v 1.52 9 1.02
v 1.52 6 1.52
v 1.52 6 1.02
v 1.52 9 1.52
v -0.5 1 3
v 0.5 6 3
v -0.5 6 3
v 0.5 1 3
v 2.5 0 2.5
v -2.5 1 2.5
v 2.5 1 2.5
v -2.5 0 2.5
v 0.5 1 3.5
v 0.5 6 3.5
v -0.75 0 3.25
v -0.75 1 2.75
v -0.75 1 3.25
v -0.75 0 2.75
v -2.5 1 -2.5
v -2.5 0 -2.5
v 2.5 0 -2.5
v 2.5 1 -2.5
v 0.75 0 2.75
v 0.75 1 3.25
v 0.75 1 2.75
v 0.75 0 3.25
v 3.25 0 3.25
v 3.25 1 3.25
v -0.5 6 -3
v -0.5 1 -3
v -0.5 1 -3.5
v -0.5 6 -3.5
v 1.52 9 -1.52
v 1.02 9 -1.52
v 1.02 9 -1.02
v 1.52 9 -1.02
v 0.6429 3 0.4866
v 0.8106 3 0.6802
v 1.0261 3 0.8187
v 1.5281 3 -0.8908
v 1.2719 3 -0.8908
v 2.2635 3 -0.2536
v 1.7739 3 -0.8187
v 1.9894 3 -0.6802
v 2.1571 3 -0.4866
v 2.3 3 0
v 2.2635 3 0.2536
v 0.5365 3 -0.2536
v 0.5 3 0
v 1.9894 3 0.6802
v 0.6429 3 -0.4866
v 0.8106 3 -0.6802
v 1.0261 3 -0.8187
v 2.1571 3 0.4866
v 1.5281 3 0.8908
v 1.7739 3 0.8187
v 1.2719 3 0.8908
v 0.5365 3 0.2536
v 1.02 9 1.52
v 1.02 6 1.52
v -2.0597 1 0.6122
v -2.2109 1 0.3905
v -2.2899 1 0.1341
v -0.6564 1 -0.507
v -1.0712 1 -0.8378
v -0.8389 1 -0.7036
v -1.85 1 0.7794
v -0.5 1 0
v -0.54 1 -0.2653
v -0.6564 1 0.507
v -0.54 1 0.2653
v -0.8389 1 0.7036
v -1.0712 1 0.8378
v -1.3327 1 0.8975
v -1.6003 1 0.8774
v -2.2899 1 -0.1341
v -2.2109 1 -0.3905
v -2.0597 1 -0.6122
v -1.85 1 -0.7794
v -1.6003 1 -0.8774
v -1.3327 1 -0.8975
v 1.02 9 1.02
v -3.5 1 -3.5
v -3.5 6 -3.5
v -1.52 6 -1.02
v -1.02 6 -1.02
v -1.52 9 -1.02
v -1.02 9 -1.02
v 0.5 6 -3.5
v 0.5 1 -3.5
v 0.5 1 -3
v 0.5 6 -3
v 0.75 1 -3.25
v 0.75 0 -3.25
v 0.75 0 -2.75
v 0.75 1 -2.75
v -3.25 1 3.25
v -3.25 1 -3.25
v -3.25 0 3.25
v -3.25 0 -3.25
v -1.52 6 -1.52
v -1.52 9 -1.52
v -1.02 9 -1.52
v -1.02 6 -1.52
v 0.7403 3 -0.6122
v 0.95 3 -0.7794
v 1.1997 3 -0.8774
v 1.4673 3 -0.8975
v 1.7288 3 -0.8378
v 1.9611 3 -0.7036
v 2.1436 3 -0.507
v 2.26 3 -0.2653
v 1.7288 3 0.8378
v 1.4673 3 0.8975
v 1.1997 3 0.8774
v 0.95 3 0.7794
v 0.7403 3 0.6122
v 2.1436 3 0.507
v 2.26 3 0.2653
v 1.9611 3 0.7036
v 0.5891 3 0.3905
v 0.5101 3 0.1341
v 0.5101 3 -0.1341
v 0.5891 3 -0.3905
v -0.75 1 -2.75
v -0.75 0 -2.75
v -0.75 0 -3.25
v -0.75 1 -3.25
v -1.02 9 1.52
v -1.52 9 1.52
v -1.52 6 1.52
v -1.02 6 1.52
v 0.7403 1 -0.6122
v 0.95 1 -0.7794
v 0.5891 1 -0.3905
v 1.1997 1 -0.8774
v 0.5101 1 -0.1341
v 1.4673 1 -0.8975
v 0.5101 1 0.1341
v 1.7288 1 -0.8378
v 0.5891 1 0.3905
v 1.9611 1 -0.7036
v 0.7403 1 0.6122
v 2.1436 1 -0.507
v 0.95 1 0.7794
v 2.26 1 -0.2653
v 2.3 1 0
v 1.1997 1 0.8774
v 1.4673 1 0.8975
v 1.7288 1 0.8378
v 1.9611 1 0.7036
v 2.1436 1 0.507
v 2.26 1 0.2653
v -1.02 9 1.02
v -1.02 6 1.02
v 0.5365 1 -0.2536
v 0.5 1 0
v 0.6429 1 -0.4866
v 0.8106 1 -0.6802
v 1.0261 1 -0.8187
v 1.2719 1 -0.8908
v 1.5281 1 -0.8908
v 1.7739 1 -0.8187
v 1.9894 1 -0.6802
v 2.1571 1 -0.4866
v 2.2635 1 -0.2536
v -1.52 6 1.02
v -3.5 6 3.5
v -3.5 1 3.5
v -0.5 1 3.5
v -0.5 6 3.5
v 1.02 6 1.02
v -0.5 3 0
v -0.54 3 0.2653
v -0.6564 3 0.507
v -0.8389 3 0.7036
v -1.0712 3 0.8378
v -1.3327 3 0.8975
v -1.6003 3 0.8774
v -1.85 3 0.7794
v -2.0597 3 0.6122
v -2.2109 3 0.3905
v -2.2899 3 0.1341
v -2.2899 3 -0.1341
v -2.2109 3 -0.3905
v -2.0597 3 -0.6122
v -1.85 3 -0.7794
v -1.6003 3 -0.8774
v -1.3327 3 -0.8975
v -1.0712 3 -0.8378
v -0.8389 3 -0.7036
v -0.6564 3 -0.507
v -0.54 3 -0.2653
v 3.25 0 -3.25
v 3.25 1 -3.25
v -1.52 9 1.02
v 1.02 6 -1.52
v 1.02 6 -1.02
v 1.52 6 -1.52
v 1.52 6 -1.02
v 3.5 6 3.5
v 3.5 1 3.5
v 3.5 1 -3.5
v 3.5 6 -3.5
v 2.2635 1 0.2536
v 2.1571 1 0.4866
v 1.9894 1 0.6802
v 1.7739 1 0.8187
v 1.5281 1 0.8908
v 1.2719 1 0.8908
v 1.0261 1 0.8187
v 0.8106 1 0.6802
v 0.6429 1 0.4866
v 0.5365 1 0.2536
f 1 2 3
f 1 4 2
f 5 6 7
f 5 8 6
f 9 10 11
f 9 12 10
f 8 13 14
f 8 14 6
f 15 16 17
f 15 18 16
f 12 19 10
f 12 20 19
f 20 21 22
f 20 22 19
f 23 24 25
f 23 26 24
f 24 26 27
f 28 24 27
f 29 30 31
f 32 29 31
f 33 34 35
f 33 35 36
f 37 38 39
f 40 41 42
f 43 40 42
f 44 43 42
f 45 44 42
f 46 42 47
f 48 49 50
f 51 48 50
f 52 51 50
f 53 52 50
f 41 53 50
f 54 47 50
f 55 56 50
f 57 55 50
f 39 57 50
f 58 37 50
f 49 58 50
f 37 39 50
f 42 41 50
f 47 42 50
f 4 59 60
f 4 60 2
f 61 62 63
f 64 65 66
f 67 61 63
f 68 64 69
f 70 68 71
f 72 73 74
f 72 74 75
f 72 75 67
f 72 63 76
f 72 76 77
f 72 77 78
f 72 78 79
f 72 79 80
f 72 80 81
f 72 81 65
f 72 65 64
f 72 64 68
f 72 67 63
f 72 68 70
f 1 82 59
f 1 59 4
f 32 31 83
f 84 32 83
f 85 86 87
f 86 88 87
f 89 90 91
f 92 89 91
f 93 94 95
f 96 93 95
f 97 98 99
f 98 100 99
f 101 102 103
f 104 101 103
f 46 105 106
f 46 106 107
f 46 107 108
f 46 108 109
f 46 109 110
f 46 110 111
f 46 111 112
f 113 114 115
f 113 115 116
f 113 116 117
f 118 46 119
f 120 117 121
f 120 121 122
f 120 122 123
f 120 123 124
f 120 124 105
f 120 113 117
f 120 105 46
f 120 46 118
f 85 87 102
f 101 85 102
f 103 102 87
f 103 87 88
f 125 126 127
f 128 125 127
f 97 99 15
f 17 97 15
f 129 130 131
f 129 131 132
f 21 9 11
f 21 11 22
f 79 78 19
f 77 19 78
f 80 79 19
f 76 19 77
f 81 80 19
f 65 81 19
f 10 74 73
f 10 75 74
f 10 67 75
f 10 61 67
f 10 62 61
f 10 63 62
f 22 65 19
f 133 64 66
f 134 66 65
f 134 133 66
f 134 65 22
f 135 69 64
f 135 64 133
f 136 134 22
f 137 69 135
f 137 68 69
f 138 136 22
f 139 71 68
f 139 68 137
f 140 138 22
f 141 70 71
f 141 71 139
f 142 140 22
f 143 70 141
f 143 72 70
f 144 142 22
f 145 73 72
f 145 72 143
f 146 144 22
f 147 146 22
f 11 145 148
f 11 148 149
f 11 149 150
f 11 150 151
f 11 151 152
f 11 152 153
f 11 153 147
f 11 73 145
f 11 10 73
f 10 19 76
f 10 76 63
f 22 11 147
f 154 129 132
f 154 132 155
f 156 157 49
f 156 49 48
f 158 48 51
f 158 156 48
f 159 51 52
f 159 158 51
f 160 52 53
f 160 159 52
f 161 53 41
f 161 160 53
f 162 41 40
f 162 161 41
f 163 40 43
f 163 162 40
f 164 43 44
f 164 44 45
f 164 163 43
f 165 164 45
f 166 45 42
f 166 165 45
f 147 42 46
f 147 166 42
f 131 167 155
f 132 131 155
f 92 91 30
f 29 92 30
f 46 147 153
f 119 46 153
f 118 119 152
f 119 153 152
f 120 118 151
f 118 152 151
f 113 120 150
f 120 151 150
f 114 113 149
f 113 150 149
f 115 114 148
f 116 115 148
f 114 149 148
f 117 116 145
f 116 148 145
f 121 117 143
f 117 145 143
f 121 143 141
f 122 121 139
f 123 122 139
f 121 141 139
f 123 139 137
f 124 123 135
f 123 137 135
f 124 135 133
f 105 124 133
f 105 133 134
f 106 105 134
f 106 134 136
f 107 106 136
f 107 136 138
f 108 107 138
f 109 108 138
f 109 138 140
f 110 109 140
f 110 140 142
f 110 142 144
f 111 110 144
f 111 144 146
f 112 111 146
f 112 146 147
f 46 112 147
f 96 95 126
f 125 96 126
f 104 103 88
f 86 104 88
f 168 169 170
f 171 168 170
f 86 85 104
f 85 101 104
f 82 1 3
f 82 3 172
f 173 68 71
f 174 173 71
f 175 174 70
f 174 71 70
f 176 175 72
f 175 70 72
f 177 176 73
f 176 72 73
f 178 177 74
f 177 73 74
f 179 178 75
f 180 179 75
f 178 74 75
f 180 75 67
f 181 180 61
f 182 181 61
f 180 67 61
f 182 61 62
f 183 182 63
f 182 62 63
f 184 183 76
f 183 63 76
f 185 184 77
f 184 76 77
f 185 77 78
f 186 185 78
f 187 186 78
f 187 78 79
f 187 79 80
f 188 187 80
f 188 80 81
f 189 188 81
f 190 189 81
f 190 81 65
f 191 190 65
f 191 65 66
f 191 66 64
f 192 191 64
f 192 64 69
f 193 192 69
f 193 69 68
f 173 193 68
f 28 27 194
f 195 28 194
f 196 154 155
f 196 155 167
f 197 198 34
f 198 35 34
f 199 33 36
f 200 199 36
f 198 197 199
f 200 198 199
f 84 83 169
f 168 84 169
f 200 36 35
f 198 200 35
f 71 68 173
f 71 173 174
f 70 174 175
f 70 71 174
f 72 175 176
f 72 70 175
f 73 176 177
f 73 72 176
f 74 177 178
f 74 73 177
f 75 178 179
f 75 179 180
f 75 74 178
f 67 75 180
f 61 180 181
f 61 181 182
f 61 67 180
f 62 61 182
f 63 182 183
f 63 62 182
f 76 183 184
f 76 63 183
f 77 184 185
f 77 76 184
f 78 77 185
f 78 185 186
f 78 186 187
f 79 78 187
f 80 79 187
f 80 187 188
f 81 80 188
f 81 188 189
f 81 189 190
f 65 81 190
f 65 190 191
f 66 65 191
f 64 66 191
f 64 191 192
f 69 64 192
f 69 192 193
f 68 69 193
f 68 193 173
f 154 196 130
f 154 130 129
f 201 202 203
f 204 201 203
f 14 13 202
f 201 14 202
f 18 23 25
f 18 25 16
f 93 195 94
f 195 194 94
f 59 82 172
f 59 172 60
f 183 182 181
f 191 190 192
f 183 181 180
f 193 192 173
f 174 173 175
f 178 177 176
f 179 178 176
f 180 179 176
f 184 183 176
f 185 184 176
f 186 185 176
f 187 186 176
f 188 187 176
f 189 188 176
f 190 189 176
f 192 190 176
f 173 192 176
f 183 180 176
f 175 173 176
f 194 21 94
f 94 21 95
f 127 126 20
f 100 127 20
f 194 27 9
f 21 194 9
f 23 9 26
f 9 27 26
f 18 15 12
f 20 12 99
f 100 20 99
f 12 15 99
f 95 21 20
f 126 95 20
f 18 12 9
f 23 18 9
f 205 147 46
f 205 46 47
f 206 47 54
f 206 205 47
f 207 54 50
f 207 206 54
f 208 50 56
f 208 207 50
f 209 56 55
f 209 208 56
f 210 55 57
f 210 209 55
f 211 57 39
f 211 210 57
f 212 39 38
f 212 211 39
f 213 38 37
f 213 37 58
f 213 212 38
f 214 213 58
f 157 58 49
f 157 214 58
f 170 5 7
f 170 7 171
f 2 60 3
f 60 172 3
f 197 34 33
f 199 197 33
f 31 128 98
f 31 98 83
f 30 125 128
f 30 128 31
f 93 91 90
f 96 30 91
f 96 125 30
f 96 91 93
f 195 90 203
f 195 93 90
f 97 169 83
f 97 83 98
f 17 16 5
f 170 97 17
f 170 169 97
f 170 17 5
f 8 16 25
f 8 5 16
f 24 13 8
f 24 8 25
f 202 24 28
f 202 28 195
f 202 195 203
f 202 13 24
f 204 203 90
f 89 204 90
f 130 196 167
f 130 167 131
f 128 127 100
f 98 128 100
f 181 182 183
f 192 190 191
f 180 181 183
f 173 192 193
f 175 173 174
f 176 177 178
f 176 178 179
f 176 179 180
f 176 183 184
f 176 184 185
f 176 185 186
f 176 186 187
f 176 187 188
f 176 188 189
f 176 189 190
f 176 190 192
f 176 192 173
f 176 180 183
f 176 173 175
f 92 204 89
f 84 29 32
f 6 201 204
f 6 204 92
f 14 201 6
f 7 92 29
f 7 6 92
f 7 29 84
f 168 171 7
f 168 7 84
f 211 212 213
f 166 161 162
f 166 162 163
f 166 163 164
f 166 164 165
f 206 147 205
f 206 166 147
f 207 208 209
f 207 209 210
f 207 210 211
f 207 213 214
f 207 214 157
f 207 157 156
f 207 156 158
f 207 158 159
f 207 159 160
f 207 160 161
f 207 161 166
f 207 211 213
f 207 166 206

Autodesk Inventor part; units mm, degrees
ref_plane "YZ Plane" through (0, 0, 0) normal (1, 0, 0) x (0, 1, 0)
ref_plane "XZ Plane" through (0, 0, 0) normal (0, 1, 0) x (-1, 0, 0)
ref_plane "XY Plane" through (0, 0, 0) normal (0, 0, 1) x (1, 0, 0)
sketch "Sketch1" plane through (0, 0, 0) normal (0, 1, 0) x (-1, 0, 0)
  line L0 (-3.5, -3.5) -> (3.5, -3.5)
  line L1 (3.5, -3.5) -> (3.5, 3.5)
  line L2 (3.5, 3.5) -> (-3.5, 3.5)
  line L3 (-3.5, 3.5) -> (-3.5, -3.5)
  line L4 (-3.5, -3.5) -> (3.5, 3.5) construction
  line L5 (3.5, -3.5) -> (-3.5, 3.5) construction
  point P0 (0, 0)
  dimension "d0" = 7
  dimension "d1" = 7
extrude "Extrusion1" add sketch "Sketch1" along normal blind 6
sketch "Sketch2" plane through (0, 0, 0) normal (0, -1, 0) x (1, 0, 0)
  line L0 (-2.5, 2.5) -> (2.5, 2.5)
  line L1 (2.5, 2.5) -> (2.5, -2.5)
  line L2 (2.5, -2.5) -> (-2.5, -2.5)
  line L3 (-2.5, -2.5) -> (-2.5, 2.5)
  line L4 (-2.5, 2.5) -> (2.5, -2.5) construction
  line L5 (2.5, 2.5) -> (-2.5, -2.5) construction
  line L6 (-0.5, 4) -> (0.5, 4)
  line L7 (0.5, 4) -> (0.5, 3)
  line L8 (0.5, 3) -> (-0.5, 3)
  line L9 (-0.5, 3) -> (-0.5, 4)
  line L10 (-3.5, 3.5) -> (3.5, 3.5) projected
  line L11 (-0.5, 4) -> (0.5, 3) construction
  line L12 (0.5, 4) -> (-0.5, 3) construction
  line L13 (-0.5, -4) -> (0.5, -4)
  line L14 (0.5, -4) -> (0.5, -3)
  line L15 (0.5, -3) -> (-0.5, -3)
  line L16 (-0.5, -3) -> (-0.5, -4)
  line L17 (3.5, -3.5) -> (-3.5, -3.5) projected
  line L18 (-0.5, -4) -> (0.5, -3) construction
  line L19 (0.5, -4) -> (-0.5, -3) construction
  line L20 (-0.5, 3.5) -> (-3.5, 3.5)
  line L21 (-3.5, -3.5) -> (-3.5, 3.5) projected
  line L22 (-3.5, -3.5) -> (-3.5, 3.5)
  line L23 (-3.5, 3.5) -> (-3.5, -3.5)
  line L24 (-3.5, -3.5) -> (-0.5, -3.5)
  line L25 (0.5, -3.5) -> (3.5, -3.5)
  line L26 (3.5, -3.5) -> (3.5, 3.5)
  line L27 (3.5, 3.5) -> (0.5, 3.5)
  line L28 (3.5, 3.5) -> (3.5, -3.5) projected
  line L29 (3.5, 3.5) -> (3.5, -3.5)
  line L30 (3.25, -3.25) -> (-3.25, -3.25)
  line L31 (-3.25, -3.25) -> (-3.25, 3.25)
  line L32 (-3.25, 3.25) -> (3.25, 3.25)
  line L33 (3.25, 3.25) -> (3.25, -3.25)
  line L34 (3.25, -3.25) -> (-3.25, 3.25) construction
  line L35 (-3.25, -3.25) -> (3.25, 3.25) construction
  line L36 (-0.75, 3.75) -> (0.75, 3.75)
  line L37 (0.75, 3.75) -> (0.75, 2.75)
  line L38 (0.75, 2.75) -> (-0.75, 2.75)
  line L39 (-0.75, 2.75) -> (-0.75, 3.75)
  line L40 (-0.75, 3.75) -> (0.75, 2.75) construction
  line L41 (0.75, 3.75) -> (-0.75, 2.75) construction
  line L42 (-0.75, -3.75) -> (0.75, -3.75)
  line L43 (0.75, -3.75) -> (0.75, -2.75)
  line L44 (0.75, -2.75) -> (-0.75, -2.75)
  line L45 (-0.75, -2.75) -> (-0.75, -3.75)
  line L46 (-0.75, -3.75) -> (0.75, -2.75) construction
  line L47 (0.75, -3.75) -> (-0.75, -2.75) construction
  point P0 (0, 0)
  point P1 (0, 3.5)
  point P2 (0, -3.5)
  point P3 (0, 3.25)
  point P4 (0, -3.25)
  point P5 (-0.75, 3.25)
  point P6 (0.75, 3.25)
  point P7 (0.75, -3.25)
  point P8 (-0.75, -3.25)
  dimension "d10" = 6.5
  dimension "d11" = 6.5
  dimension "d12" = 1
extrude "Extrusion2" cut sketch "Sketch2" against normal blind 1 contours L0 L1 L2 L3 | L9 L32 L39 L10 | L10 L37 L32 L7 | L9 L8 L7 L32 L37 L38 L39 | L39 L32 L31 L30 L45 L17 L21 L10 | L10 L26 L17 L43 L30 L33 L32 L37 | L45 L30 L16 L17 | L17 L14 L30 L43 | L45 L44 L43 L30 L14 L15 L16
extrude "Extrusion3" cut sketch "Sketch2" against normal blind 10 contours L6 L7 L36 L9 | L36 L7 L10 L9 | L10 L7 L32 L9 | L32 L7 L8 L9 | L17 L14 L42 L16 | L16 L30 L14 L17 | L16 L15 L14 L30 | L42 L14 L13 L16
sketch "Sketch3" plane through (0, 6, 0) normal (0, 1, 0) x (1, 0, 0)
  line L0 (-1.4, -1.4) -> (1.4, -1.4)
  line L1 (1.4, -1.4) -> (1.4, 1.4)
  line L2 (1.4, 1.4) -> (-1.4, 1.4)
  line L3 (-1.4, 1.4) -> (-1.4, -1.4)
  line L4 (-1.4, -1.4) -> (1.4, 1.4) construction
  line L5 (1.4, -1.4) -> (-1.4, 1.4) construction
  line L6 (-1.65, 1.65) -> (-1.15, 1.65)
  line L7 (-1.15, 1.65) -> (-1.15, 1.15)
  line L8 (-1.15, 1.15) -> (-1.65, 1.15)
  line L9 (-1.65, 1.15) -> (-1.65, 1.65)
  line L10 (-1.65, 1.65) -> (-1.15, 1.15) construction
  line L11 (-1.15, 1.65) -> (-1.65, 1.15) construction
  line L12 (1.15, 1.65) -> (1.65, 1.65)
  line L13 (1.65, 1.65) -> (1.65, 1.15)
  line L14 (1.65, 1.15) -> (1.15, 1.15)
  line L15 (1.15, 1.15) -> (1.15, 1.65)
  line L16 (1.15, 1.65) -> (1.65, 1.15) construction
  line L17 (1.65, 1.65) -> (1.15, 1.15) construction
  line L18 (1.15, -1.15) -> (1.65, -1.15)
  line L19 (1.65, -1.15) -> (1.65, -1.65)
  line L20 (1.65, -1.65) -> (1.15, -1.65)
  line L21 (1.15, -1.65) -> (1.15, -1.15)
  line L22 (1.15, -1.15) -> (1.65, -1.65) construction
  line L23 (1.65, -1.15) -> (1.15, -1.65) construction
  line L24 (-1.65, -1.15) -> (-1.15, -1.15)
  line L25 (-1.15, -1.15) -> (-1.15, -1.65)
  line L26 (-1.15, -1.65) -> (-1.65, -1.65)
  line L27 (-1.65, -1.65) -> (-1.65, -1.15)
  line L28 (-1.65, -1.15) -> (-1.15, -1.65) construction
  line L29 (-1.15, -1.15) -> (-1.65, -1.65) construction
  point P0 (0, 0)
  dimension "d17" = 2.8
  dimension "d18" = 2.8
  dimension "d19" = 0.5
  dimension "d20" = 0.5
  dimension "d21" = 0.5
  dimension "d22" = 0.5
  dimension "d23" = 0.5
  dimension "d24" = 0.5
  dimension "d25" = 0.5
  dimension "d26" = 0.5
extrude "Extrusion4" add sketch "Sketch3" along normal blind 6 separate body contours L3 L24 L25 L0 | L0 L25 L26 L27 L24 L3 | L21 L18 L1 L0 | L0 L1 L18 L19 L20 L21 | L8 L9 L6 L7 L2 L3 | L3 L2 L7 L8 | L14 L15 L2 L1 | L1 L2 L15 L12 L13 L14
sketch "Sketch4" plane through (0, 12, 0) normal (0, 1, 0) x (1, 0, 0)
  line L0 (-1.27, 1.27) -> (1.27, 1.27)
  line L1 (1.27, 1.27) -> (1.27, -1.27)
  line L2 (1.27, -1.27) -> (-1.27, -1.27)
  line L3 (-1.27, -1.27) -> (-1.27, 1.27)
  line L4 (-1.27, 1.27) -> (1.27, -1.27) construction
  line L5 (1.27, 1.27) -> (-1.27, -1.27) construction
  line L6 (-1.52, -1.52) -> (-1.02, -1.52)
  line L7 (-1.02, -1.52) -> (-1.02, -1.02)
  line L8 (-1.02, -1.02) -> (-1.52, -1.02)
  line L9 (-1.52, -1.02) -> (-1.52, -1.52)
  line L10 (-1.52, -1.52) -> (-1.02, -1.02) construction
  line L11 (-1.02, -1.52) -> (-1.52, -1.02) construction
  line L12 (1.02, -1.52) -> (1.52, -1.52)
  line L13 (1.52, -1.52) -> (1.52, -1.02)
  line L14 (1.52, -1.02) -> (1.02, -1.02)
  line L15 (1.02, -1.02) -> (1.02, -1.52)
  line L16 (1.02, -1.52) -> (1.52, -1.02) construction
  line L17 (1.52, -1.52) -> (1.02, -1.02) construction
  line L18 (1.02, 1.52) -> (1.52, 1.52)
  line L19 (1.52, 1.52) -> (1.52, 1.02)
  line L20 (1.52, 1.02) -> (1.02, 1.02)
  line L21 (1.02, 1.02) -> (1.02, 1.52)
  line L22 (1.02, 1.52) -> (1.52, 1.02) construction
  line L23 (1.52, 1.52) -> (1.02, 1.02) construction
  line L24 (-1.52, 1.52) -> (-1.02, 1.52)
  line L25 (-1.02, 1.52) -> (-1.02, 1.02)
  line L26 (-1.02, 1.02) -> (-1.52, 1.02)
  line L27 (-1.52, 1.02) -> (-1.52, 1.52)
  line L28 (-1.52, 1.52) -> (-1.02, 1.02) construction
  line L29 (-1.02, 1.52) -> (-1.52, 1.02) construction
  line L30 (-1.945, 1.8515) -> (1.945, 1.8515)
  line L31 (1.945, 1.8515) -> (1.945, -1.8515)
  line L32 (1.945, -1.8515) -> (-1.945, -1.8515)
  line L33 (-1.945, -1.8515) -> (-1.945, 1.8515)
  line L34 (-1.945, 1.8515) -> (1.945, -1.8515) construction
  line L35 (1.945, 1.8515) -> (-1.945, -1.8515) construction
  point P0 (0, 0)
  dimension "d29" = 2.54
  dimension "d30" = 2.54
  dimension "d31" = 0.5
  dimension "d32" = 0.5
  dimension "d33" = 0.5
  dimension "d34" = 0.5
  dimension "d35" = 0.5
  dimension "d36" = 0.5
  dimension "d37" = 0.5
  dimension "d38" = 0.5
extrude "Extrusion5" cut sketch "Sketch4" against normal blind 6 contours L3 L26 L27 L24 L25 L0 | L0 L25 L26 L3 | L0 L21 L20 L1 L14 L15 L2 L7 L8 L3 L26 L25 | L21 L18 L19 L20 L1 L0 | L0 L1 L20 L21 | L8 L7 L2 L3 | L3 L2 L7 L6 L9 L8 | L14 L13 L12 L15 L2 L1 | L1 L2 L15 L14 | L30 L31 L32 L33 bodies 2
extrude "Extrusion6" add sketch "Sketch4" against normal blind 6 separate body contours L3 L26 L27 L24 L25 L0 | L0 L25 L26 L3 | L21 L18 L19 L20 L1 L0 | L0 L1 L20 L21 | L8 L7 L2 L3 | L3 L2 L7 L6 L9 L8 | L14 L13 L12 L15 L2 L1 | L1 L2 L15 L14
sketch "Sketch5" plane through (0, 1, 0) normal (0, -1, 0) x (1, 0, 0)
  line L0 (0, 0) -> (-1.4, 0)
  line L1 (0, 0) -> (1.4, 0)
  circle A0 centre (-1.4, 0) radius 0.9
  circle A1 centre (1.4, 0) radius 0.9
  dimension "d43" = 1.4
  dimension "d44" = 1.4
  dimension "d45" = 1.8
  dimension "d46" = 1.8
extrude "Extrusion7" cut sketch "Sketch5" against normal blind 2 bodies 1
extrude "Extrusion8" add sketch "Sketch5" against normal blind 2 separate body contours A1
extrude "Extrusion9" add sketch "Sketch5" against normal blind 2 separate body contours A0
sketch "Sketch6" plane through (0, 12, 0) normal (0, 1, 0) x (1, 0, 0)
  line L0 (-5.946, 4.9955) -> (6.4952, 4.9955)
  line L1 (6.4952, 4.9955) -> (6.4952, -3.9816)
  line L2 (6.4952, -3.9816) -> (-5.946, -3.9816)
  line L3 (-5.946, -3.9816) -> (-5.946, 4.9955)
  point P0 (0, 0)
extrude "Extrusion10" cut sketch "Sketch6" against normal blind 3 bodies 3
properties part number "CNY70"
